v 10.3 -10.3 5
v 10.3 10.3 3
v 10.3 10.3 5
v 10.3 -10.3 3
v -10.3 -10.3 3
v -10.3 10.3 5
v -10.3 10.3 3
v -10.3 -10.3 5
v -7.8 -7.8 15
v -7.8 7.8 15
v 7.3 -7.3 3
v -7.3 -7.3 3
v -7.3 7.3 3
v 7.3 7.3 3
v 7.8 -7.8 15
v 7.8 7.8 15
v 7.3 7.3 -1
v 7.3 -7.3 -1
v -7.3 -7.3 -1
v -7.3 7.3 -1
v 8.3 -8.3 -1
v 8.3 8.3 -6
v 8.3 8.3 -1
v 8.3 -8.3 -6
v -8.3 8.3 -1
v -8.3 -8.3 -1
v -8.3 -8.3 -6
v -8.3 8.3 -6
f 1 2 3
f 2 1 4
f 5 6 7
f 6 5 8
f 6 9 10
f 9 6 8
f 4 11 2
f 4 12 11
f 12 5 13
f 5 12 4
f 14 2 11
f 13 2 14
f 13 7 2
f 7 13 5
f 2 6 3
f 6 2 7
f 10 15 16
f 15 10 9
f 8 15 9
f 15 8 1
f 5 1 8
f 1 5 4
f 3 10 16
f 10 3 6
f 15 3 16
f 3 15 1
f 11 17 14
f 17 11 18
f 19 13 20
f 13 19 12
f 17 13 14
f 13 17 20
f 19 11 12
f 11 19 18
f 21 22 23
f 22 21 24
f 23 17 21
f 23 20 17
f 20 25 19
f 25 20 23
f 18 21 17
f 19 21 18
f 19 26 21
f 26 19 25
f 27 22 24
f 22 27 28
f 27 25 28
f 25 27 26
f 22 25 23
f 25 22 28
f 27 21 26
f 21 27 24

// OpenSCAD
tolerance = 0.3;
$fn = $preview ? 20 : 100;

module key(){
    translate([0, 0, 4])
    hull(){
        cube([20 + tolerance * 2, 20 + tolerance * 2, 2], center = true);
        translate([0, 0, 10])
        cube([15 + tolerance * 2, 15 + tolerance * 2, 2], center = true);
    }
    
    translate([0, 0, 2])
    cube([14 + tolerance * 2, 14 + tolerance * 2, 4], center = true);
    
    translate([0, 0, -1])
    cube([14 + tolerance * 2, 14 + tolerance * 2, 2], center = true);
    
    
    translate([0, 0, -3.5])
    cube([16 + tolerance * 2, 16 + tolerance * 2, 5], center = true);
}

key();
